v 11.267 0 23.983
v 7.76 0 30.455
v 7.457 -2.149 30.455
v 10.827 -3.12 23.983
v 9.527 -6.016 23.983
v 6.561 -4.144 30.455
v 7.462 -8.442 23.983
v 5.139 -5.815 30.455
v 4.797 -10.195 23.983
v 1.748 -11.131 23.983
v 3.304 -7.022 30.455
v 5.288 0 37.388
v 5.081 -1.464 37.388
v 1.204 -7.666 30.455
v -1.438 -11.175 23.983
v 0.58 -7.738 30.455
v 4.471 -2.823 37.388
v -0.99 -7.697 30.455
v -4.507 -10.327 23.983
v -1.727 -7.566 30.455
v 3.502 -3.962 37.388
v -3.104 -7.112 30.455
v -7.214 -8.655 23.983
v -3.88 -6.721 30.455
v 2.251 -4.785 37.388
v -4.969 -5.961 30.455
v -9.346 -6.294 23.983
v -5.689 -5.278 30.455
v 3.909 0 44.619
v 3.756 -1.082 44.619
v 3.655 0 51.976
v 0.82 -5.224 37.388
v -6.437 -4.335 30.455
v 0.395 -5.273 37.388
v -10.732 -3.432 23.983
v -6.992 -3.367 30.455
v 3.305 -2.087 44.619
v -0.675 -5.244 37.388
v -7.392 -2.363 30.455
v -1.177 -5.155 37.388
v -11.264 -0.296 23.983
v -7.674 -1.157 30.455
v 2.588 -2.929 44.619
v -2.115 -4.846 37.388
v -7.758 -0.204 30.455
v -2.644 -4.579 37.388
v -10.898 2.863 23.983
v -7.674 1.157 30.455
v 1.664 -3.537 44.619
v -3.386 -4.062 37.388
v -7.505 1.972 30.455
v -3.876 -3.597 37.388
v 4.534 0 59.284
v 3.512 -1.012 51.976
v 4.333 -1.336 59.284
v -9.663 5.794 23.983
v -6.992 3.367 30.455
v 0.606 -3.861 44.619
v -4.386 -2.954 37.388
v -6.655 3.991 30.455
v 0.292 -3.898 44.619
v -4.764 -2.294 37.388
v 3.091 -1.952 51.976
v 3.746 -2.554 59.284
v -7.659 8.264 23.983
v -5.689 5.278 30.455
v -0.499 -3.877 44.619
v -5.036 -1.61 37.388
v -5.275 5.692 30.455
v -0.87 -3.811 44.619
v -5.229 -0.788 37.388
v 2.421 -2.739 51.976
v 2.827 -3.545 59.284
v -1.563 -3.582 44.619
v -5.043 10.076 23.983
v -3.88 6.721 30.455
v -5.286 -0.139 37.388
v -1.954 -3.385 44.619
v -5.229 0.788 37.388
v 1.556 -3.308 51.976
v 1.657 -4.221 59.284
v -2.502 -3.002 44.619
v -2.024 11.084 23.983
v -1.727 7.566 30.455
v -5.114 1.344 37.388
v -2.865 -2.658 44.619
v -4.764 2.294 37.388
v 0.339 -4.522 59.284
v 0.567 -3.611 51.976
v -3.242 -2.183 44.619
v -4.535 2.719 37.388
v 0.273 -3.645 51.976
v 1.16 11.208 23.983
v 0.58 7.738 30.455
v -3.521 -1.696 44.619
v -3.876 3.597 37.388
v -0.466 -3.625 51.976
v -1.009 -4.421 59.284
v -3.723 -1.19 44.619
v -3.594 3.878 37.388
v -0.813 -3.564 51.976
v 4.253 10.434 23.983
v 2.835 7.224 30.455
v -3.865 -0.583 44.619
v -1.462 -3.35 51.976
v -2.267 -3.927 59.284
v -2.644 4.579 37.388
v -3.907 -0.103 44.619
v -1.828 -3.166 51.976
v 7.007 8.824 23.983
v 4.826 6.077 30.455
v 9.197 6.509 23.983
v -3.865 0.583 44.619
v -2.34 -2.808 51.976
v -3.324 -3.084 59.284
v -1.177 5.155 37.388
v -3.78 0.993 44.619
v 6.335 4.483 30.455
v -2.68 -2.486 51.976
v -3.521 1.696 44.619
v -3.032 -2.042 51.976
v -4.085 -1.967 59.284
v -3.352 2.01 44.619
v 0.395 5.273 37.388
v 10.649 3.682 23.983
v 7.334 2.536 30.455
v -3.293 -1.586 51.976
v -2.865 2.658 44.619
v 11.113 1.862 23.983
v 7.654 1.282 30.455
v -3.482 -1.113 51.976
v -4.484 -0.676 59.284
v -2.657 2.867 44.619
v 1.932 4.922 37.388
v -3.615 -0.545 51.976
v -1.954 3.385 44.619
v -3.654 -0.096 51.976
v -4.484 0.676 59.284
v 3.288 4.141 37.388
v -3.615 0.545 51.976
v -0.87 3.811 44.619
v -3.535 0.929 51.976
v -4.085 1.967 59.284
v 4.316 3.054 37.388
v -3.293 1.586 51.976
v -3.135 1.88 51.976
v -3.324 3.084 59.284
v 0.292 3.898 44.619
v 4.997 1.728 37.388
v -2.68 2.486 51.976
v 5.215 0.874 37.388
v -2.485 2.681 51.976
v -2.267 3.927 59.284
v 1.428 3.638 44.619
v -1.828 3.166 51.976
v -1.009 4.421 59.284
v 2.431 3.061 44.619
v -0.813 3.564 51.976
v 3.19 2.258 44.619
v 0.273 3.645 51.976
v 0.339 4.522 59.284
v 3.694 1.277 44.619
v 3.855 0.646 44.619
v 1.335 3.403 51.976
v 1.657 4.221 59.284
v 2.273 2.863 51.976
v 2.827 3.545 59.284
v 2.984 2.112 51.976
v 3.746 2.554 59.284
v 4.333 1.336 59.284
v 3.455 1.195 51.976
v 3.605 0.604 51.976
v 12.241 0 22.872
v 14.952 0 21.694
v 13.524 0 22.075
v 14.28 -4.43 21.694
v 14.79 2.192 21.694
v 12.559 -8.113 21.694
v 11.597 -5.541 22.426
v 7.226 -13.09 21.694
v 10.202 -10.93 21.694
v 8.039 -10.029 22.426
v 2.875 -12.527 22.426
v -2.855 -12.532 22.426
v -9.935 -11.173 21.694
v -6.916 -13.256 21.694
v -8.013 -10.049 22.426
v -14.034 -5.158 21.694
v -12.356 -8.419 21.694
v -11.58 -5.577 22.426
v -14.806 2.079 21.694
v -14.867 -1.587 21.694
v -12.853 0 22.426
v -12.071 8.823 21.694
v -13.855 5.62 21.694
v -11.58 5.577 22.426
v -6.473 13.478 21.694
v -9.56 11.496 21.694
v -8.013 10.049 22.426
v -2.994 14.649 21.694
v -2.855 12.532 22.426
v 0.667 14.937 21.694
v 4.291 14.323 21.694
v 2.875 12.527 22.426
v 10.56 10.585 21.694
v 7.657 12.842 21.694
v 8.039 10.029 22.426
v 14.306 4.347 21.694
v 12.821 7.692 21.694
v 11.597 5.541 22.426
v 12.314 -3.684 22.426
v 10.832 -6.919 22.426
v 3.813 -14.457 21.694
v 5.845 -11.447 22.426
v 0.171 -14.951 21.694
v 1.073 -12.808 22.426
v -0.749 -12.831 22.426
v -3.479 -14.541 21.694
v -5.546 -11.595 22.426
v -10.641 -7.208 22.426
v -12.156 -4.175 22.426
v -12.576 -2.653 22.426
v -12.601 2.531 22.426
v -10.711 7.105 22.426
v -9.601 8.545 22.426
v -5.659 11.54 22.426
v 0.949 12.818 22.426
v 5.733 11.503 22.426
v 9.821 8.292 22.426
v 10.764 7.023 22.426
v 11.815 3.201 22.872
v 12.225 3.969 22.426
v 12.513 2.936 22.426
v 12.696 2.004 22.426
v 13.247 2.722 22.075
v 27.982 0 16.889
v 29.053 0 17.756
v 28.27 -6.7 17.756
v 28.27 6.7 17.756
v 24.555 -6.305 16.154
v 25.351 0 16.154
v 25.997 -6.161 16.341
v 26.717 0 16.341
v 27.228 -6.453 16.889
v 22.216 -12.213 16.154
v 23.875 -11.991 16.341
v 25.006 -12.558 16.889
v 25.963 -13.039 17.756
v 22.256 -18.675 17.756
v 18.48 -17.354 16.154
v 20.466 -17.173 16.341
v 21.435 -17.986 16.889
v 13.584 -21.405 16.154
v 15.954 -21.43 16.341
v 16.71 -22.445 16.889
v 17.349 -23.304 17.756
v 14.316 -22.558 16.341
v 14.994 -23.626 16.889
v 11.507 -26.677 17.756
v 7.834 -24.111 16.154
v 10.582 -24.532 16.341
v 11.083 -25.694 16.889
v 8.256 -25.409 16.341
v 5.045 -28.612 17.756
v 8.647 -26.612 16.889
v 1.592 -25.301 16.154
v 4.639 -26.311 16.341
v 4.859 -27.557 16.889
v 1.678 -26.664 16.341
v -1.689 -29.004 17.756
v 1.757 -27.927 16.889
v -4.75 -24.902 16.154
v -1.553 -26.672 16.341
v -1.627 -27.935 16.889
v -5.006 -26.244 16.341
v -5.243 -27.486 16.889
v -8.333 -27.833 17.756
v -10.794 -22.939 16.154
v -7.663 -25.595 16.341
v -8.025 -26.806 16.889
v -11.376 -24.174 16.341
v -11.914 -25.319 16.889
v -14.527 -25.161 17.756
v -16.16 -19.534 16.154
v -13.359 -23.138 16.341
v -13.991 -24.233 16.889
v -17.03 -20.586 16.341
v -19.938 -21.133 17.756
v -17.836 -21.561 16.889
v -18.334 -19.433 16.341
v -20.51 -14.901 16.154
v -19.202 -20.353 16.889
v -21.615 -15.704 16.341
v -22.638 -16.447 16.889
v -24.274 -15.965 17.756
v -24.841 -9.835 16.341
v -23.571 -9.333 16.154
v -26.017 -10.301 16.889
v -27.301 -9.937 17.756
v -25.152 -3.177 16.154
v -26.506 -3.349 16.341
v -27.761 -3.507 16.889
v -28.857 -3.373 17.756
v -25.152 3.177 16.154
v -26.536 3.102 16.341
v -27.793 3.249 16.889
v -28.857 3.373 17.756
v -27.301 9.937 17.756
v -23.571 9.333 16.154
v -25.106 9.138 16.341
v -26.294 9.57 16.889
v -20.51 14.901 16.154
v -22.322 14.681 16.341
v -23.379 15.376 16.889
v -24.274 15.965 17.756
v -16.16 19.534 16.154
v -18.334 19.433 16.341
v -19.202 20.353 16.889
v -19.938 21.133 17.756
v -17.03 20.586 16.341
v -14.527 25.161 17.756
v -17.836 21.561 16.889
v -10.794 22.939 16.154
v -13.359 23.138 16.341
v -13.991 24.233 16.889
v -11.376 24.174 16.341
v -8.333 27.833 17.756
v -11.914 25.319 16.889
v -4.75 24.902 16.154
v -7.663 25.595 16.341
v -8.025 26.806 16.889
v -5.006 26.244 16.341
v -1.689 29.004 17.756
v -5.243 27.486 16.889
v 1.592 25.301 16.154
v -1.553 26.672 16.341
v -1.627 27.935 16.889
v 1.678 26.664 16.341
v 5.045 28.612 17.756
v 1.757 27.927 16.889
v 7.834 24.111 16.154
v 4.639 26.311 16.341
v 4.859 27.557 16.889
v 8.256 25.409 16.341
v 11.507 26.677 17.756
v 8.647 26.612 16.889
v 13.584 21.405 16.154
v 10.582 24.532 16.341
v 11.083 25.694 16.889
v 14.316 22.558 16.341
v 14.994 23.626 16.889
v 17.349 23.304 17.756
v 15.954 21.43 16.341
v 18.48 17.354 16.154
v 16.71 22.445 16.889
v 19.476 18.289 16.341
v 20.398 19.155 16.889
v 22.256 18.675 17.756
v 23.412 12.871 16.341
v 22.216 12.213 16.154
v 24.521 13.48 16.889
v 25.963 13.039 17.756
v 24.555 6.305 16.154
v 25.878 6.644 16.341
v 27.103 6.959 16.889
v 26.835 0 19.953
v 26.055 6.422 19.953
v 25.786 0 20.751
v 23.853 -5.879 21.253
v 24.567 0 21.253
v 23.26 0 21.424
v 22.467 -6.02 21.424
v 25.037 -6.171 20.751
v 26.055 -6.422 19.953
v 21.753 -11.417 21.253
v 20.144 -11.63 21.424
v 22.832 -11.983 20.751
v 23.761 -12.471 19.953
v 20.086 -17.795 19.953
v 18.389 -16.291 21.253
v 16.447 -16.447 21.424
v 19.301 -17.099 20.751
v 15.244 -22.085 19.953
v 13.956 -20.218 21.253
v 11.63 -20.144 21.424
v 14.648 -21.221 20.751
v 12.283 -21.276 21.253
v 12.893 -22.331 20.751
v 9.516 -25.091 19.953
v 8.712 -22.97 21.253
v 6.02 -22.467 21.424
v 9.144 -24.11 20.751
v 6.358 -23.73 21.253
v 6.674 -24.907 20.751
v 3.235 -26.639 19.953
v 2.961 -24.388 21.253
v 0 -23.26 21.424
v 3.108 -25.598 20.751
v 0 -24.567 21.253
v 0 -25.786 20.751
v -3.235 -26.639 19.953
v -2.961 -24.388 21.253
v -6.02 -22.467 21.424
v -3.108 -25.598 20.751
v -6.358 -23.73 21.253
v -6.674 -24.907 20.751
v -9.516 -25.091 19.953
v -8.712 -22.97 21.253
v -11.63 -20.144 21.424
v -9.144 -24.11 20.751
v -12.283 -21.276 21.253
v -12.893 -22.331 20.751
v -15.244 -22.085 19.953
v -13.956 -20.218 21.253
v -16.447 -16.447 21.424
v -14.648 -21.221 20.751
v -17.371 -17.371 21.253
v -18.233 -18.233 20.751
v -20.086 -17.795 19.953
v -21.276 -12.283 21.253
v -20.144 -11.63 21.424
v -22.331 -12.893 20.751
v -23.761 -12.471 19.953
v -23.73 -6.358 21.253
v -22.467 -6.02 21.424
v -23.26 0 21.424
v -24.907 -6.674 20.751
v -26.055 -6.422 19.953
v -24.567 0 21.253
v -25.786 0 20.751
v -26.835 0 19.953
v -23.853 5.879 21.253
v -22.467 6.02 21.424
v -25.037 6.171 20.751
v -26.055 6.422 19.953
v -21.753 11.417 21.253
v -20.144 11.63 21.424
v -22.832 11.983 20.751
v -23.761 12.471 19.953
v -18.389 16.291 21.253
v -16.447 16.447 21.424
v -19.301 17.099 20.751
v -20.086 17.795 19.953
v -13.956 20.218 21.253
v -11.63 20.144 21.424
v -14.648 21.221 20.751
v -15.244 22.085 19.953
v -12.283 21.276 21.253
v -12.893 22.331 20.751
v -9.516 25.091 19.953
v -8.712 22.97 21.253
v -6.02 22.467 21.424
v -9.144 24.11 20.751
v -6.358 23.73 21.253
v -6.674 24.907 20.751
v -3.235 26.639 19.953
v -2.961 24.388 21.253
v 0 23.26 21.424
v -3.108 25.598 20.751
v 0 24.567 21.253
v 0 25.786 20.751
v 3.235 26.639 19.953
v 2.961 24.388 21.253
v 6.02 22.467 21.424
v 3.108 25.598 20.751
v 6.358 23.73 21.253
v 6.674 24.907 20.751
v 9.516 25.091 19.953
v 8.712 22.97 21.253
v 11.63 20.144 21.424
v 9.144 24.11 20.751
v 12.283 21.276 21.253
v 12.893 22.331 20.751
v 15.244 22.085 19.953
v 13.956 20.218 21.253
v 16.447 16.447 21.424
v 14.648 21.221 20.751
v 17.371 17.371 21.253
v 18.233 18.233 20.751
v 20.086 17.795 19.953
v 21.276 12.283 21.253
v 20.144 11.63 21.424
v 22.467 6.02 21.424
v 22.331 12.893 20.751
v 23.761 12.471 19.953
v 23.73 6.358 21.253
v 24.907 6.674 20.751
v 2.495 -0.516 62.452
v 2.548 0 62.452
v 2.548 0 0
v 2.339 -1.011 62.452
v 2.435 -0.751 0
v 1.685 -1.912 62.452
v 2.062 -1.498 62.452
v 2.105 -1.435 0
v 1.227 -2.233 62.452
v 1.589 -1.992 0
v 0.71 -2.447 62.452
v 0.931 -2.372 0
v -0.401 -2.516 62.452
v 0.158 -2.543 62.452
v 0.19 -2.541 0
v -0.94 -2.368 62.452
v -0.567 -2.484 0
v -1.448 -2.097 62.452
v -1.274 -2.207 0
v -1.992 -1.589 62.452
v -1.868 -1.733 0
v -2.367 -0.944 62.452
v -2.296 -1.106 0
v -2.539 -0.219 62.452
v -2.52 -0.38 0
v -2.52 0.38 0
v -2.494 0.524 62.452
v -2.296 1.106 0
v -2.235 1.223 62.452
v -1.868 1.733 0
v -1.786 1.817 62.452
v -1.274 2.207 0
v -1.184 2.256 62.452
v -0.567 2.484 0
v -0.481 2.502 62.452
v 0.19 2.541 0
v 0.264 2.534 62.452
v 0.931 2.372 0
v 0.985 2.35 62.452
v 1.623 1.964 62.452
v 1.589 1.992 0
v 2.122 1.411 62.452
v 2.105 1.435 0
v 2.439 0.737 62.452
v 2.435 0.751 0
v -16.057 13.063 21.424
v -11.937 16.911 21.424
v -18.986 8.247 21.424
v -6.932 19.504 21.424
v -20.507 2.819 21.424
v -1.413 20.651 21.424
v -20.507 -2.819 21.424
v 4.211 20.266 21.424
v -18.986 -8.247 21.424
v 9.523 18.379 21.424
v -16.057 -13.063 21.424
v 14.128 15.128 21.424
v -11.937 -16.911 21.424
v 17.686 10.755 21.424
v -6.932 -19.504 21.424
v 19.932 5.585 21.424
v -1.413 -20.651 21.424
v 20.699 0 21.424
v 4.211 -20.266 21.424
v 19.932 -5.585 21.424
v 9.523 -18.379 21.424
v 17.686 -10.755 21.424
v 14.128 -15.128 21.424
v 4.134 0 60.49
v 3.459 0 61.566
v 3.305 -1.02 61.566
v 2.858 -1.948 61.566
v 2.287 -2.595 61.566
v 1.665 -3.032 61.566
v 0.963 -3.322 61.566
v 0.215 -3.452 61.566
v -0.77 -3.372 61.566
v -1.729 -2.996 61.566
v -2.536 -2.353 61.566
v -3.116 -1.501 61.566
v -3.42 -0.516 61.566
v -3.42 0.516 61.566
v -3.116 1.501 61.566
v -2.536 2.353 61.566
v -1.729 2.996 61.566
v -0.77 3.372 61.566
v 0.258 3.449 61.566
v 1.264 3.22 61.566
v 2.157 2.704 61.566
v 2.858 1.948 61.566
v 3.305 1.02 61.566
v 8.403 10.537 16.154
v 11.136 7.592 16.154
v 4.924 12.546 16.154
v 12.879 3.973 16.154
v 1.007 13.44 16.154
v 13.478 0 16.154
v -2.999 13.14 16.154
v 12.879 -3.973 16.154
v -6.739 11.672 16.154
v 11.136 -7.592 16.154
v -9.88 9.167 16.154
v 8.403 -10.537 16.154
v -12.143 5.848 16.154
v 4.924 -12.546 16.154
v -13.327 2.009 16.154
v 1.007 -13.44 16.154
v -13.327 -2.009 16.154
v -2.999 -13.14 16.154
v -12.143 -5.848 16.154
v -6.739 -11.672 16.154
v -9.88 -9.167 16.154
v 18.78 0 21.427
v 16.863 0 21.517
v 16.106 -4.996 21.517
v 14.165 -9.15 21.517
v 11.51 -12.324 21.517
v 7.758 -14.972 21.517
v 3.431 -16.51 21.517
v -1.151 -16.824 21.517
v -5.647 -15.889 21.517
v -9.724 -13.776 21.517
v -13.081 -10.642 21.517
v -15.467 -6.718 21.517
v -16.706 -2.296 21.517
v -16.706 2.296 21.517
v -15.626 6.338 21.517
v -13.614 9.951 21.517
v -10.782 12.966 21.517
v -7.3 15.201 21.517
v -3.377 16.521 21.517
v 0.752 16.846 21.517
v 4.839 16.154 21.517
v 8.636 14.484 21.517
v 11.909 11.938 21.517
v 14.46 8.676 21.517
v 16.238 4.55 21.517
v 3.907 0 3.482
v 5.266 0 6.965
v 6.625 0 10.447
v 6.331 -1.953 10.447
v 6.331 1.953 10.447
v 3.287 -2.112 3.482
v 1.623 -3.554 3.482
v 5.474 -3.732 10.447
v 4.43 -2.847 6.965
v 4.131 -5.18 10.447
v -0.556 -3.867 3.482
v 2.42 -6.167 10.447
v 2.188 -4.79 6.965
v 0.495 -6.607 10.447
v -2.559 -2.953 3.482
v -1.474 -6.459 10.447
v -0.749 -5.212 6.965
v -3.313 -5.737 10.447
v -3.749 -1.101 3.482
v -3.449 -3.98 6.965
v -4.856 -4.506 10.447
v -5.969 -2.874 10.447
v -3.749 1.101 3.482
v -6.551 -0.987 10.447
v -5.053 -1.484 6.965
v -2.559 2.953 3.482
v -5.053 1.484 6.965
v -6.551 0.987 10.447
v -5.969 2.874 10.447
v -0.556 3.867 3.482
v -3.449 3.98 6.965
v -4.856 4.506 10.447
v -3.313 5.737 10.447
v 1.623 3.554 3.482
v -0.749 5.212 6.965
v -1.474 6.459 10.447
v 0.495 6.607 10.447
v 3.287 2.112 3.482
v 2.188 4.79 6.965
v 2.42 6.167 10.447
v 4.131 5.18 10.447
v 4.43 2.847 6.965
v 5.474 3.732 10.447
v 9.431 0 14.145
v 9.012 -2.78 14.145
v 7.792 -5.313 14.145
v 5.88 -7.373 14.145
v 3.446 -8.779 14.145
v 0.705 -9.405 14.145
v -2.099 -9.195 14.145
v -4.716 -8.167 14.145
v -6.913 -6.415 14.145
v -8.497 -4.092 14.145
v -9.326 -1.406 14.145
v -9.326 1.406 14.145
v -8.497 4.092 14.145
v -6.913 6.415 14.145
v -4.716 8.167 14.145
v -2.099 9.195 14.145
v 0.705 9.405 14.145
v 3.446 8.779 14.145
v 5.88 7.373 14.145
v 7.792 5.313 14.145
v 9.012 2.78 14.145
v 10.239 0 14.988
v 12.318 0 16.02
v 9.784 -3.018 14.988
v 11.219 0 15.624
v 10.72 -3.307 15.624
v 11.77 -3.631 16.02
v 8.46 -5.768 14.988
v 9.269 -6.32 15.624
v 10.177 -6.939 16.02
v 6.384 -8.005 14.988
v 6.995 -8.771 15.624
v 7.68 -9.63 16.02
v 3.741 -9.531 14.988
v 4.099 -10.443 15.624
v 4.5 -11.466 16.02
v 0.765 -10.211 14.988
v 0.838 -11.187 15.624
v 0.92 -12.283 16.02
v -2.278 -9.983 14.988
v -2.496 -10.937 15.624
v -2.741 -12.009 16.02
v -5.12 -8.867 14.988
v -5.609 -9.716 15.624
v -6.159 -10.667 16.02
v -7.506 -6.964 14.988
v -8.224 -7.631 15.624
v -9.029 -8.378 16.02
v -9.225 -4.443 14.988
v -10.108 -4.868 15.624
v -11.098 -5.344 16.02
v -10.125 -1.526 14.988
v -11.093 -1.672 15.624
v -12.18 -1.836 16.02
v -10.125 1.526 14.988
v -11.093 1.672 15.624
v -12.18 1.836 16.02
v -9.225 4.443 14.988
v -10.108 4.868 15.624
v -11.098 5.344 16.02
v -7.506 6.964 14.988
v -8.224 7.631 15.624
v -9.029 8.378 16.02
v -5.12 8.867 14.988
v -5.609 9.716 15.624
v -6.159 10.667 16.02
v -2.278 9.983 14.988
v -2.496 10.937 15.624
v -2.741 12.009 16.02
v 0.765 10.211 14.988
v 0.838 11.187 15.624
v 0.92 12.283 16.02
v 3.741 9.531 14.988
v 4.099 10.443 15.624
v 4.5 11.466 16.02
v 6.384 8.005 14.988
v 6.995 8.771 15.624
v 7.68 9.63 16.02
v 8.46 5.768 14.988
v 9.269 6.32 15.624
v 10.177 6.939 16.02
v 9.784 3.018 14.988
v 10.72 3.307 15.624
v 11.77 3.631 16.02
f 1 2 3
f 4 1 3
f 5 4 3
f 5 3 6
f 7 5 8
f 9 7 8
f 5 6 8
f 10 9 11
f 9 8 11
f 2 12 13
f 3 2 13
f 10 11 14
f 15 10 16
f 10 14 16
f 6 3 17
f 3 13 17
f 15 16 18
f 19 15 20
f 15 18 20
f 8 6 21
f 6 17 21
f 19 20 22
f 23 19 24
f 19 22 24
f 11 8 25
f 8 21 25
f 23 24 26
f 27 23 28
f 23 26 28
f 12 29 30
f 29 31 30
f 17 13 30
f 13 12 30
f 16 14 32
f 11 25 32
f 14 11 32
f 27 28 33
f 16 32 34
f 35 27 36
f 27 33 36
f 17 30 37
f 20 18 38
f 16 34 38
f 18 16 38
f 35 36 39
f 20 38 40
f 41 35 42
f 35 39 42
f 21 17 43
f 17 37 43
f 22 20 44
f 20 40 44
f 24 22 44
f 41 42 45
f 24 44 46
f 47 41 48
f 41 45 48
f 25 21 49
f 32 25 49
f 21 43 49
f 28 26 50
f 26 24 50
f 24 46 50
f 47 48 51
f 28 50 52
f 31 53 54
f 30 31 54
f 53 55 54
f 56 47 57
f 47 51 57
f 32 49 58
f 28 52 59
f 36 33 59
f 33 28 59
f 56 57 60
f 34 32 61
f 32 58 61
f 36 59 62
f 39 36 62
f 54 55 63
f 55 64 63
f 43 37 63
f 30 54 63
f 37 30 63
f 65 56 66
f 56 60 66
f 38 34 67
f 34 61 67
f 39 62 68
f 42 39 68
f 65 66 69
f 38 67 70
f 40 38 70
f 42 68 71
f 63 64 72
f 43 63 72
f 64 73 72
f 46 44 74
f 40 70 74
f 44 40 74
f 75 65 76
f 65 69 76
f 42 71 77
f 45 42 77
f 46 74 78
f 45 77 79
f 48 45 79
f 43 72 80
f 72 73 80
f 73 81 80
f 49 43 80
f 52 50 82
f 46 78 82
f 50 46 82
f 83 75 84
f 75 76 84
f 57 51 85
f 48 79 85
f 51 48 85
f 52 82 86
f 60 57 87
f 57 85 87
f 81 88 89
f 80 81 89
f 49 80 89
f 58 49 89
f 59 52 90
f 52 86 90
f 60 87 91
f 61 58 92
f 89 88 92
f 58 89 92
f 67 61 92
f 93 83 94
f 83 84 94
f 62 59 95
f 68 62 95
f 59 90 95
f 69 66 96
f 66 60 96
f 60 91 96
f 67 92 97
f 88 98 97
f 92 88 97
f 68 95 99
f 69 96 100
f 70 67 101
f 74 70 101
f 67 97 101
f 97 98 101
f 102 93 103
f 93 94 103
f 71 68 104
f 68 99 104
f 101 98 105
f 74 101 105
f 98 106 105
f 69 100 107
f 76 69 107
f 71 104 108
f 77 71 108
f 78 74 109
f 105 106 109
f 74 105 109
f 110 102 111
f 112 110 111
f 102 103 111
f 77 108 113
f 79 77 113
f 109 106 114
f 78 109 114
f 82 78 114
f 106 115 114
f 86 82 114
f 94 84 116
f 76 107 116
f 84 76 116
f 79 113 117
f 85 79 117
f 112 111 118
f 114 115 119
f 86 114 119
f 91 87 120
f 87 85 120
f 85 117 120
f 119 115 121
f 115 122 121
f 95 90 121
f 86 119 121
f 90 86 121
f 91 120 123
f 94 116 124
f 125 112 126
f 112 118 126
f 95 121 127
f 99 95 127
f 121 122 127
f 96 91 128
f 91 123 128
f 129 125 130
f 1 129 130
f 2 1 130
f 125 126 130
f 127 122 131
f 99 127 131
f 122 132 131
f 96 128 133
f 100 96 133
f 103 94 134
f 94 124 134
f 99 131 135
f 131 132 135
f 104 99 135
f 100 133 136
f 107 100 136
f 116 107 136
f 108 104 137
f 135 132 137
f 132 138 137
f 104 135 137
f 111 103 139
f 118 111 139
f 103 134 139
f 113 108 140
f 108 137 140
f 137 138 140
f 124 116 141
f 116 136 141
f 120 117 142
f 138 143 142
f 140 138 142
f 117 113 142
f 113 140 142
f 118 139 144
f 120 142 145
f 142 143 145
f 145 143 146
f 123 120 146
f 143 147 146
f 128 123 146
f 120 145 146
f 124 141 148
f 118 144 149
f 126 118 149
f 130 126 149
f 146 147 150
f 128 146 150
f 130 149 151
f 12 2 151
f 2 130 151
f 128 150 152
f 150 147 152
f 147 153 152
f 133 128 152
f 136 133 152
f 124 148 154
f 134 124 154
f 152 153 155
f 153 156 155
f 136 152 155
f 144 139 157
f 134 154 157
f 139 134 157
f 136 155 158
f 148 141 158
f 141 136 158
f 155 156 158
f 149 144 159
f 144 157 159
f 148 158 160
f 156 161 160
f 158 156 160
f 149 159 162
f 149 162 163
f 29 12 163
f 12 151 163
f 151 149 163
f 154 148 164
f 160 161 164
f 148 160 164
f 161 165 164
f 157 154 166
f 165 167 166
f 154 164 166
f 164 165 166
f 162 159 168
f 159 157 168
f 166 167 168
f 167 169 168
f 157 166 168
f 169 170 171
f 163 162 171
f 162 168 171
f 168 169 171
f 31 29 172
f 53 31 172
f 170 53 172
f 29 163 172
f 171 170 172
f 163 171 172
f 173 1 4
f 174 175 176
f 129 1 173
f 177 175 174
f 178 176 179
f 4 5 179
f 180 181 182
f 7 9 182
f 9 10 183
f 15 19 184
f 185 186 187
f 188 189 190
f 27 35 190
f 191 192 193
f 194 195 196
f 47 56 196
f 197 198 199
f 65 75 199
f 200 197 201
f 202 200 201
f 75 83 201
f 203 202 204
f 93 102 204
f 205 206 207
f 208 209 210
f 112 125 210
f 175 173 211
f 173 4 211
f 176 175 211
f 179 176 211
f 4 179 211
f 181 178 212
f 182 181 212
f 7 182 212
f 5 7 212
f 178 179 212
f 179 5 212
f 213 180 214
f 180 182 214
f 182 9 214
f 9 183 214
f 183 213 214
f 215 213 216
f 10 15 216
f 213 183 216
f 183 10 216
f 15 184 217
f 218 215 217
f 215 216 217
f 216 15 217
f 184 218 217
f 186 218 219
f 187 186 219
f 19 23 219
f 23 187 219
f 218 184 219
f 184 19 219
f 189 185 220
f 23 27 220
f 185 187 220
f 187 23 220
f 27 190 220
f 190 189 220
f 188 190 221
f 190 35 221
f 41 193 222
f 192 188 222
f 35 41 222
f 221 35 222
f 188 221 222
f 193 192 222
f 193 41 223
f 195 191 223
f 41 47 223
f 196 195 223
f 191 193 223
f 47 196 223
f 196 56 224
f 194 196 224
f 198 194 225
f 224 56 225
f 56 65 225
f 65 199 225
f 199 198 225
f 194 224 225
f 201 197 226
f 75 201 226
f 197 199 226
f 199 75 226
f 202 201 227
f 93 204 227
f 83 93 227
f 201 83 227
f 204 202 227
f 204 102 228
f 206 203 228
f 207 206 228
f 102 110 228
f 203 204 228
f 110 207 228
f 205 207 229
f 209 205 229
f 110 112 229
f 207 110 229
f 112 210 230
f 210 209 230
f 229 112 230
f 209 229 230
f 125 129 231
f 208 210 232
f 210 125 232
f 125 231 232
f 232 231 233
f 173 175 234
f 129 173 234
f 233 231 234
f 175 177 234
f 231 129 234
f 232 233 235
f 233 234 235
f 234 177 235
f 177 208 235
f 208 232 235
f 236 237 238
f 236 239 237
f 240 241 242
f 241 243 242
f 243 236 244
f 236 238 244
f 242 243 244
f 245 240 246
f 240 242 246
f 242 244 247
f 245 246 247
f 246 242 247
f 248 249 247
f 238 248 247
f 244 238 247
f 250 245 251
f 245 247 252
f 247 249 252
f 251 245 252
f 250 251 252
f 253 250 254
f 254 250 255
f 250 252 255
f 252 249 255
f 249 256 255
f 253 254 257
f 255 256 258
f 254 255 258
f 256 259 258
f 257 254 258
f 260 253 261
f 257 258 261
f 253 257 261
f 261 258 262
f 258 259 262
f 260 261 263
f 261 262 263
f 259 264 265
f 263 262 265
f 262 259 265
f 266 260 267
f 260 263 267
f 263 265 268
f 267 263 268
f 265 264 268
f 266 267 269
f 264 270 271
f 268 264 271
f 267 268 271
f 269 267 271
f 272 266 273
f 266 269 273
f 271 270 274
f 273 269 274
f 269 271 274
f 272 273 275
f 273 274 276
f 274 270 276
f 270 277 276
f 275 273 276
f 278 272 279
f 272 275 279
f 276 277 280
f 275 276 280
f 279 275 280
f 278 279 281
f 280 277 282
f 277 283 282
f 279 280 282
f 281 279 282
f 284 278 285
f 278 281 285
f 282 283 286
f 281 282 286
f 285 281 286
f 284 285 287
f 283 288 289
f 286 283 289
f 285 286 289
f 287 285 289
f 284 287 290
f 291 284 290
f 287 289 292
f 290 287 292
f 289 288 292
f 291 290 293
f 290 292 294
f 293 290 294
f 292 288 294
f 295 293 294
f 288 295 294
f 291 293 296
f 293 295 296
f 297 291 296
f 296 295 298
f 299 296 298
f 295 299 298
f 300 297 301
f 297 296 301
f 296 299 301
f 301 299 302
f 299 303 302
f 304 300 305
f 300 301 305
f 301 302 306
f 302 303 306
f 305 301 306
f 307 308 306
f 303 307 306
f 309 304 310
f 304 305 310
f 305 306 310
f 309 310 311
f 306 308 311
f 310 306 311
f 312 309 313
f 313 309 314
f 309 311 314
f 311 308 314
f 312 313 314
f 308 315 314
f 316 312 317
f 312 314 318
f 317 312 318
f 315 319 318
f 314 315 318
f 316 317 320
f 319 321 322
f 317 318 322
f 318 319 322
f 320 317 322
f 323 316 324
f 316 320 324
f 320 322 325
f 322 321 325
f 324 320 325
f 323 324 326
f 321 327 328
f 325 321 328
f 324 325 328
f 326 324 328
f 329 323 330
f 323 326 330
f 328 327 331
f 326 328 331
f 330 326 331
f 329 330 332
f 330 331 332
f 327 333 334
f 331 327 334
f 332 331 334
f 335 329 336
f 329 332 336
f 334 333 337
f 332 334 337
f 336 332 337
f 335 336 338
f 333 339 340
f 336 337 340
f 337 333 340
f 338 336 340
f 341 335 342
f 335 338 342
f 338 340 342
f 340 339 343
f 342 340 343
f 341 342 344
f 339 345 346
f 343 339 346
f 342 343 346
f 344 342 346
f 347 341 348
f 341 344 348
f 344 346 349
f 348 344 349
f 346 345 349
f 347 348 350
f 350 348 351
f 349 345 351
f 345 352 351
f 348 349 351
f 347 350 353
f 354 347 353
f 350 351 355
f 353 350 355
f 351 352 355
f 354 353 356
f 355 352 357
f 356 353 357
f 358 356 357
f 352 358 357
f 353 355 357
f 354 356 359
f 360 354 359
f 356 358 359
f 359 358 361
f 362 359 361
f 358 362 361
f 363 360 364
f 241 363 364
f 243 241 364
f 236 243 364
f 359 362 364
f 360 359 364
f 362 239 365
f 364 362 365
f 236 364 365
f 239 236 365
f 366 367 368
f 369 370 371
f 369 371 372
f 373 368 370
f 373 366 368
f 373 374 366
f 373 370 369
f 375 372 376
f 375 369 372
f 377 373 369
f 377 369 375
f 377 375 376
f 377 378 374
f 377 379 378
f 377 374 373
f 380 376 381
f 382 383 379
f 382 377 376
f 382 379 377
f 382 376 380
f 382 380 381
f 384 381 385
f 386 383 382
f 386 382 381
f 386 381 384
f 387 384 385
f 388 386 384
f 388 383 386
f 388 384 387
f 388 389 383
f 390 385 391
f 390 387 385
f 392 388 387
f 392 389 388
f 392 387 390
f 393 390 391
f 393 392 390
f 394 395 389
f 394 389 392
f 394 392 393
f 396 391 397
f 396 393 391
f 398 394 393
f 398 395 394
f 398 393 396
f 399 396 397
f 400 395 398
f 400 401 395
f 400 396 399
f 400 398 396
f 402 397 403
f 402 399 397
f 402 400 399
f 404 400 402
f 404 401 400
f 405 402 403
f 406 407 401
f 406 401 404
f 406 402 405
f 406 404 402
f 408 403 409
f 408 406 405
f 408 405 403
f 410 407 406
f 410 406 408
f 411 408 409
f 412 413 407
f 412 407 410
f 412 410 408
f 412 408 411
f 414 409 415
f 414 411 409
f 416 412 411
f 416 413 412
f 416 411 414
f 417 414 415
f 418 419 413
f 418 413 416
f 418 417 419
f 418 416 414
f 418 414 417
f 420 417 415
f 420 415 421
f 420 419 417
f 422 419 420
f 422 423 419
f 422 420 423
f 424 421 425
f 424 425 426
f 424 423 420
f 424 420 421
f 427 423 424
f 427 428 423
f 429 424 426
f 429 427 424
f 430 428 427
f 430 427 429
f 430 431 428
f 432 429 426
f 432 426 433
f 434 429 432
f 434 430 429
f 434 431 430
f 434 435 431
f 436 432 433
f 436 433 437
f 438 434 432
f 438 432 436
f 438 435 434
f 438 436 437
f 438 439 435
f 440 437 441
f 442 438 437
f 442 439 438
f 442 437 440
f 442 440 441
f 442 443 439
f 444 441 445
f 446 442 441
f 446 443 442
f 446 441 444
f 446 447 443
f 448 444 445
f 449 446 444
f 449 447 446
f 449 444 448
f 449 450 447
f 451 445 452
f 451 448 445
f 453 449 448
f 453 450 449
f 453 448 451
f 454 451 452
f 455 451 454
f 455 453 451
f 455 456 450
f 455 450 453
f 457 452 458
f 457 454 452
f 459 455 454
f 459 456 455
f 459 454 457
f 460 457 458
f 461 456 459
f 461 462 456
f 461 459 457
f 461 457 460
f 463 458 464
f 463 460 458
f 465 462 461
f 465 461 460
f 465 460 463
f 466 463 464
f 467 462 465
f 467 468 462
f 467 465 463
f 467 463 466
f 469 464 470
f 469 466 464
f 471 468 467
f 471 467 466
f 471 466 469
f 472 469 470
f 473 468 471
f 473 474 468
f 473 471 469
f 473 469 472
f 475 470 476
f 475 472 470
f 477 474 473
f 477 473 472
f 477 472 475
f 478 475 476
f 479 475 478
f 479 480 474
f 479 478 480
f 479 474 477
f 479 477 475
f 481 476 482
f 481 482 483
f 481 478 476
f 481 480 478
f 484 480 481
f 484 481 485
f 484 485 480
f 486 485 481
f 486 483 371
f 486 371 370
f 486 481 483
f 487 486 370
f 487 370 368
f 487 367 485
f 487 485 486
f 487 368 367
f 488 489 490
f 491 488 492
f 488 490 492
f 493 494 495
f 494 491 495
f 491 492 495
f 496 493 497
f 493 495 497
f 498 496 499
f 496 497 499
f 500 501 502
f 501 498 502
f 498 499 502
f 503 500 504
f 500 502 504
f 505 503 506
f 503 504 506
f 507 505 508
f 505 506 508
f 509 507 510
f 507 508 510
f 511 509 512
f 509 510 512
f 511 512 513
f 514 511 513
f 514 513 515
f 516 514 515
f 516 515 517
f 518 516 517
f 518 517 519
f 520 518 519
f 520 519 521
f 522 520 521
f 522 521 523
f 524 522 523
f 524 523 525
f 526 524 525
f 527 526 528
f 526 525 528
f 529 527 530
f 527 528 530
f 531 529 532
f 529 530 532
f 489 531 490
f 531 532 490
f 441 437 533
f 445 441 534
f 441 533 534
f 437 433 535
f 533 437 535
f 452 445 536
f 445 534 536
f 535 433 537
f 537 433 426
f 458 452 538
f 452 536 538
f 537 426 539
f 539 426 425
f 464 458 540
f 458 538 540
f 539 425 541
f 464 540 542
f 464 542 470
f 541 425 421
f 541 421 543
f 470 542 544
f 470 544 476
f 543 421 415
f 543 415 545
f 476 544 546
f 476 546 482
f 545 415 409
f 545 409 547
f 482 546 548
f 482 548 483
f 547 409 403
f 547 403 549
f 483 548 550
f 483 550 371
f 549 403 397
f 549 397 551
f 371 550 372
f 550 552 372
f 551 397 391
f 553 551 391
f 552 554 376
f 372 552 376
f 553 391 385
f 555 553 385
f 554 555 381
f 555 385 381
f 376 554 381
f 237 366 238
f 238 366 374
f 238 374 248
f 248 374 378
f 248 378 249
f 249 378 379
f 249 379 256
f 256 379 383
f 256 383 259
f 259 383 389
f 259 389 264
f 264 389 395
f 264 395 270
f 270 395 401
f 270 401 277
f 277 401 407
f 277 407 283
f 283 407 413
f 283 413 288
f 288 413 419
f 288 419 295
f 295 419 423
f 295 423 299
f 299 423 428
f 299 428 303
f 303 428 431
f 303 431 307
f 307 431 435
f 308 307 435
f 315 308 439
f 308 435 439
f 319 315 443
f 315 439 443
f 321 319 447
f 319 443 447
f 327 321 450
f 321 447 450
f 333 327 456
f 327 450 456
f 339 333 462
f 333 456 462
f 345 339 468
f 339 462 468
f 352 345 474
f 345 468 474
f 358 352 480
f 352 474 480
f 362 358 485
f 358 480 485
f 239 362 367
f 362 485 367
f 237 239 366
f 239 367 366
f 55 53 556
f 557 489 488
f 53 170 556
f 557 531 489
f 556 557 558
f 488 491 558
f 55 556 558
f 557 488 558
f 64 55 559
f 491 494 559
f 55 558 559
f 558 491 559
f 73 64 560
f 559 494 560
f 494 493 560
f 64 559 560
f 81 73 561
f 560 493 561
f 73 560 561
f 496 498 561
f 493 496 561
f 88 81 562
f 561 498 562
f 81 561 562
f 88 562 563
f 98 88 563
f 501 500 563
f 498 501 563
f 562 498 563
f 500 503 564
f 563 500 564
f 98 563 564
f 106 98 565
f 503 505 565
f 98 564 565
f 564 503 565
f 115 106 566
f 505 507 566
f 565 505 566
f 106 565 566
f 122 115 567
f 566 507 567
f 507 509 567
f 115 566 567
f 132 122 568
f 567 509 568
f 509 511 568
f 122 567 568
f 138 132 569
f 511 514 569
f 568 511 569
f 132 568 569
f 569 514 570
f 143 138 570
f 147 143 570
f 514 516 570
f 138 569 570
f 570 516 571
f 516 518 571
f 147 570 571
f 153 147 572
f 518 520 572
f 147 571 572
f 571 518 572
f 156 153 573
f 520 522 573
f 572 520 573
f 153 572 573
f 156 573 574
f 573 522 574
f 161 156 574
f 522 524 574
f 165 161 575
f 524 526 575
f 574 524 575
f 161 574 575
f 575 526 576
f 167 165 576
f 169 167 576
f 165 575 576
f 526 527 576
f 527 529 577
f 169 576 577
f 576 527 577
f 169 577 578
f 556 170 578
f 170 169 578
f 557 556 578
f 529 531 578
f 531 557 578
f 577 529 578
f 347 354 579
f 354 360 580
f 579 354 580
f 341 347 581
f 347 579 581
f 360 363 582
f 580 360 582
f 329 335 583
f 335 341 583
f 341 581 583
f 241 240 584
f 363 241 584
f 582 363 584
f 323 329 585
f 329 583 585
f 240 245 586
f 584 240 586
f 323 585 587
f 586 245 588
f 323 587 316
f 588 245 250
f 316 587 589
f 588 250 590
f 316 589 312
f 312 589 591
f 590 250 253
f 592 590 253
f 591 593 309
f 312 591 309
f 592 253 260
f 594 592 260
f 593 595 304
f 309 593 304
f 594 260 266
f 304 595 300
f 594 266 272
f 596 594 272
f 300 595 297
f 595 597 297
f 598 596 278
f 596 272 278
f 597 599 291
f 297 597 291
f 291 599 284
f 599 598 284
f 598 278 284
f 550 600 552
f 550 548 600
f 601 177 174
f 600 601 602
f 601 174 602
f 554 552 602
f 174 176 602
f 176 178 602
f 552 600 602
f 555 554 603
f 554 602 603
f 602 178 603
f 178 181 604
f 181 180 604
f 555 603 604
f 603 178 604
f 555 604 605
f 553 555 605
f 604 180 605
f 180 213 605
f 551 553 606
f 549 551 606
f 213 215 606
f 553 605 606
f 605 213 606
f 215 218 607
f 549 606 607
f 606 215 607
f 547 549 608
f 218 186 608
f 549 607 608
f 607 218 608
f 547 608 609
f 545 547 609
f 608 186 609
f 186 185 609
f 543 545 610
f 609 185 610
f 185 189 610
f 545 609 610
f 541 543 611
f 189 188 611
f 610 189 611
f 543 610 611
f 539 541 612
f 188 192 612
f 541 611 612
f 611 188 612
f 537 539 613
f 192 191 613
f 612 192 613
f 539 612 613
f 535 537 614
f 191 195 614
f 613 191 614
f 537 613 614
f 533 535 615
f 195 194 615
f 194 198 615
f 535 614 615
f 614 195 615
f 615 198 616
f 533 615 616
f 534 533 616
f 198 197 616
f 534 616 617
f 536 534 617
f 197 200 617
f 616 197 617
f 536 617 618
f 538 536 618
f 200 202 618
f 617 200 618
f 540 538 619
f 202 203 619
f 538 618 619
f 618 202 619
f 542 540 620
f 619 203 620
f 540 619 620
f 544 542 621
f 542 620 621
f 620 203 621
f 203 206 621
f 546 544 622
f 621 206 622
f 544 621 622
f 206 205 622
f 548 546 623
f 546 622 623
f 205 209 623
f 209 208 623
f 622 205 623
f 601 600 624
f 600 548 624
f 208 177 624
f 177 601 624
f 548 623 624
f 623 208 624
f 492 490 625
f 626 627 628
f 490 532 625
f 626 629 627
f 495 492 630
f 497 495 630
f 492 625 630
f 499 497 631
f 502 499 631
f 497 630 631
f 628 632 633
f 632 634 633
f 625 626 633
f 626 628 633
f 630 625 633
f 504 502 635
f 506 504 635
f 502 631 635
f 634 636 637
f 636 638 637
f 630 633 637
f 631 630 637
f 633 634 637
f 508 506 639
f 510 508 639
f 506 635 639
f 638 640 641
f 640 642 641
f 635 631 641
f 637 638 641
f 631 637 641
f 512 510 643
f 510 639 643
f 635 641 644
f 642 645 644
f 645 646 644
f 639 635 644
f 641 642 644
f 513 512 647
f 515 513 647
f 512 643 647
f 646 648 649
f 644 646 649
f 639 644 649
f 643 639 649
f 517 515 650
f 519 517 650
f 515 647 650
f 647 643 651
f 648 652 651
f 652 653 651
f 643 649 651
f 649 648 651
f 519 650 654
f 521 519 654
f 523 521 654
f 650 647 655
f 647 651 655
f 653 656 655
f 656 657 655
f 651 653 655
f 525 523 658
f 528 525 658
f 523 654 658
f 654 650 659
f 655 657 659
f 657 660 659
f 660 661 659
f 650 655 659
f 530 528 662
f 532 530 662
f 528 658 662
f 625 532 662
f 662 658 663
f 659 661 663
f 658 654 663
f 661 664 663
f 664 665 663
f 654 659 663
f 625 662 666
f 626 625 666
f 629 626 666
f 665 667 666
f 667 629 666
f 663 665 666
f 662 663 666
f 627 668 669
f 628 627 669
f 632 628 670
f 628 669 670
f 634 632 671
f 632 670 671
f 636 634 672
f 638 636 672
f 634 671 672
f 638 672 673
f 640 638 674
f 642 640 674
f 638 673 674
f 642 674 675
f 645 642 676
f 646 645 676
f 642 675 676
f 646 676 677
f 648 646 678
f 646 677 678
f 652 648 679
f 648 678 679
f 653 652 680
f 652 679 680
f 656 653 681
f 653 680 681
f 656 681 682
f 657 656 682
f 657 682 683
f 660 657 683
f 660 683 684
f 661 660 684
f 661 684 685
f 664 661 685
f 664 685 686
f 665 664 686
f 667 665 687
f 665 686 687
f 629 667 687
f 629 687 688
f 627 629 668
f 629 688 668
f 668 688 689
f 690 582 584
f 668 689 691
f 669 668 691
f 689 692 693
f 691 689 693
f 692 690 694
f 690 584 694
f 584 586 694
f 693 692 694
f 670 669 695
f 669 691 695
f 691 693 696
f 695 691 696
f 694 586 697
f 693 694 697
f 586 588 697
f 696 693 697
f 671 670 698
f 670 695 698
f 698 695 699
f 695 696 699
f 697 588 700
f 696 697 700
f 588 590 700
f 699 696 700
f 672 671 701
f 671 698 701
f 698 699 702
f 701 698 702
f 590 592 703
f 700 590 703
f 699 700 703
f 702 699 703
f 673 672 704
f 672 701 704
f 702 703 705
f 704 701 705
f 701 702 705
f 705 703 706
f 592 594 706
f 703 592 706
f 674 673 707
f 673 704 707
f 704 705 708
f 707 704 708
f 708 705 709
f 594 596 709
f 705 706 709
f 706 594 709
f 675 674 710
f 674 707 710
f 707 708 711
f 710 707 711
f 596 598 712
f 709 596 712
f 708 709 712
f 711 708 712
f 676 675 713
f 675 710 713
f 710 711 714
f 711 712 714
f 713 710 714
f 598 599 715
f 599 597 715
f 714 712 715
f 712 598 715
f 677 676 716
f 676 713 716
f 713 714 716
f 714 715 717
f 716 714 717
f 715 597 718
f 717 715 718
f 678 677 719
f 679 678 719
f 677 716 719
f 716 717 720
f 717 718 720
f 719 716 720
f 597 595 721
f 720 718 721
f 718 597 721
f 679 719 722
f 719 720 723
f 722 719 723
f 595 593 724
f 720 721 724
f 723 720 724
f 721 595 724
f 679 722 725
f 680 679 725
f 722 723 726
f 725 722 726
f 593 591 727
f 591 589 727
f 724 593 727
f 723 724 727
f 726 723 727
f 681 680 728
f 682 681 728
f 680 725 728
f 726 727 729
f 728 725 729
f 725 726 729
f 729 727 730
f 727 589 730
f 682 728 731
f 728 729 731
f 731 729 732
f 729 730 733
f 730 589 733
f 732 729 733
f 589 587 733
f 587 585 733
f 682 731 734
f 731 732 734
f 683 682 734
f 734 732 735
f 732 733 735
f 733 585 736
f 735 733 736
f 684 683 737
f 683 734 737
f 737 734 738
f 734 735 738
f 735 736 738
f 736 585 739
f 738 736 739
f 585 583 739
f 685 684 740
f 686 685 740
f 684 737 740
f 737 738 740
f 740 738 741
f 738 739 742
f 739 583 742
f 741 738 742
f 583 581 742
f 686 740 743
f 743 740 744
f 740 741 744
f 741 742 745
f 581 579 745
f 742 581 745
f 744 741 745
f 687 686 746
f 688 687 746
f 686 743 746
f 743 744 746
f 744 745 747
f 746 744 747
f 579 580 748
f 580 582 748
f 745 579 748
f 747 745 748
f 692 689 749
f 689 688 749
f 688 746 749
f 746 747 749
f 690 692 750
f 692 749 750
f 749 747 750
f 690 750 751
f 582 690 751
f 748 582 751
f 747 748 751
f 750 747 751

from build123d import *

# Parameters (mm, degrees)
F2_DEPTH = 63.5010001
F3_R     = 5.08
F5_R     = 5.08
F6_R     = 5.08


# Not quite as in the source:
# - a fillet or chamfer that OpenCascade refuses, or shapes differently, is made with other operations: its cross-section is extruded or revolved along the edge and cut away or added


with BuildPart() as f1:
    # F0 (on Front) → F1 (revolve)
    with BuildSketch(Plane.XZ):
        with BuildLine():
            ThreePointArc((4.5341940657, 59.2838630326), (2.9433454488, 62.1191947856), (0, 63.5))
            Line((0, 63.5), (0, 0))
            Line((0, 0), (2.5480911136, 0))
            Line((2.5480911136, 0), (6.6250329837, 10.4471649975))
            Line((6.6250329837, 10.4471649975), (10.9556252941, 16.1543861032))
            Line((10.9556252941, 16.1543861032), (30.48, 16.1543861032))
            Line((30.48, 16.1543861032), (30.4299078499, 21.4240159839))
            Line((30.4299078499, 21.4240159839), (20.699405237, 21.4240159839))
            ThreePointArc((20.699405237, 21.4240159839), (16.6336106625, 21.5337881018), (12.597086859, 22.0329985023))
            ThreePointArc((12.597086859, 22.0329985023), (4.6942529553, 39.8204748482), (4.5341940657, 59.2838630326))
        make_face()
    revolve(axis=Axis((0, 0, 31.75), (0, 0, -1)))

    # F2 (cut, through all): a face of the model
    f2_faces = [f1.faces().sort_by_distance(p)[0] for p in [
        (0, 0, 0),
    ]]
    extrude(f2_faces, amount=-F2_DEPTH, mode=Mode.SUBTRACT)

    # F3
    f3_edges = [f1.edges().sort_by_distance(p)[0] for p in [
        (-10.955625, 0, 16.154386),
        (-30.48, 0, 16.154386),
    ]]
    fillet(f3_edges, radius=F3_R)

    # F4: chamfer of 5.08 on 1 edges, made by hand

    # F4_s1 → F4_t2 (revolve, cut)
    with BuildSketch(Plane.XZ):
        Polygon((30.478195231, 16.3442454843), (25.3499078499, 21.4240159839), (30.4299078499, 21.4240159839), align=None)
    revolve(axis=Axis((0, 0, 21.4240159839), (0, 0, -1)), mode=Mode.SUBTRACT)

    # F5
    f5_edges = [f1.edges().sort_by_distance(p)[0] for p in [
        (-20.699405, 0, 21.424016),
        (-12.597087, 0, 22.032999),
        (16.633611, 0, 21.533788),
    ]]
    fillet(f5_edges, radius=F5_R)

    # F6
    f6_edges = [f1.edges().sort_by_distance(p)[0] for p in [
        (-25.349908, 0, 21.424016),
        (-20.699405, 0, 21.424016),
    ]]
    fillet(f6_edges, radius=F6_R)


solid = f1.part
